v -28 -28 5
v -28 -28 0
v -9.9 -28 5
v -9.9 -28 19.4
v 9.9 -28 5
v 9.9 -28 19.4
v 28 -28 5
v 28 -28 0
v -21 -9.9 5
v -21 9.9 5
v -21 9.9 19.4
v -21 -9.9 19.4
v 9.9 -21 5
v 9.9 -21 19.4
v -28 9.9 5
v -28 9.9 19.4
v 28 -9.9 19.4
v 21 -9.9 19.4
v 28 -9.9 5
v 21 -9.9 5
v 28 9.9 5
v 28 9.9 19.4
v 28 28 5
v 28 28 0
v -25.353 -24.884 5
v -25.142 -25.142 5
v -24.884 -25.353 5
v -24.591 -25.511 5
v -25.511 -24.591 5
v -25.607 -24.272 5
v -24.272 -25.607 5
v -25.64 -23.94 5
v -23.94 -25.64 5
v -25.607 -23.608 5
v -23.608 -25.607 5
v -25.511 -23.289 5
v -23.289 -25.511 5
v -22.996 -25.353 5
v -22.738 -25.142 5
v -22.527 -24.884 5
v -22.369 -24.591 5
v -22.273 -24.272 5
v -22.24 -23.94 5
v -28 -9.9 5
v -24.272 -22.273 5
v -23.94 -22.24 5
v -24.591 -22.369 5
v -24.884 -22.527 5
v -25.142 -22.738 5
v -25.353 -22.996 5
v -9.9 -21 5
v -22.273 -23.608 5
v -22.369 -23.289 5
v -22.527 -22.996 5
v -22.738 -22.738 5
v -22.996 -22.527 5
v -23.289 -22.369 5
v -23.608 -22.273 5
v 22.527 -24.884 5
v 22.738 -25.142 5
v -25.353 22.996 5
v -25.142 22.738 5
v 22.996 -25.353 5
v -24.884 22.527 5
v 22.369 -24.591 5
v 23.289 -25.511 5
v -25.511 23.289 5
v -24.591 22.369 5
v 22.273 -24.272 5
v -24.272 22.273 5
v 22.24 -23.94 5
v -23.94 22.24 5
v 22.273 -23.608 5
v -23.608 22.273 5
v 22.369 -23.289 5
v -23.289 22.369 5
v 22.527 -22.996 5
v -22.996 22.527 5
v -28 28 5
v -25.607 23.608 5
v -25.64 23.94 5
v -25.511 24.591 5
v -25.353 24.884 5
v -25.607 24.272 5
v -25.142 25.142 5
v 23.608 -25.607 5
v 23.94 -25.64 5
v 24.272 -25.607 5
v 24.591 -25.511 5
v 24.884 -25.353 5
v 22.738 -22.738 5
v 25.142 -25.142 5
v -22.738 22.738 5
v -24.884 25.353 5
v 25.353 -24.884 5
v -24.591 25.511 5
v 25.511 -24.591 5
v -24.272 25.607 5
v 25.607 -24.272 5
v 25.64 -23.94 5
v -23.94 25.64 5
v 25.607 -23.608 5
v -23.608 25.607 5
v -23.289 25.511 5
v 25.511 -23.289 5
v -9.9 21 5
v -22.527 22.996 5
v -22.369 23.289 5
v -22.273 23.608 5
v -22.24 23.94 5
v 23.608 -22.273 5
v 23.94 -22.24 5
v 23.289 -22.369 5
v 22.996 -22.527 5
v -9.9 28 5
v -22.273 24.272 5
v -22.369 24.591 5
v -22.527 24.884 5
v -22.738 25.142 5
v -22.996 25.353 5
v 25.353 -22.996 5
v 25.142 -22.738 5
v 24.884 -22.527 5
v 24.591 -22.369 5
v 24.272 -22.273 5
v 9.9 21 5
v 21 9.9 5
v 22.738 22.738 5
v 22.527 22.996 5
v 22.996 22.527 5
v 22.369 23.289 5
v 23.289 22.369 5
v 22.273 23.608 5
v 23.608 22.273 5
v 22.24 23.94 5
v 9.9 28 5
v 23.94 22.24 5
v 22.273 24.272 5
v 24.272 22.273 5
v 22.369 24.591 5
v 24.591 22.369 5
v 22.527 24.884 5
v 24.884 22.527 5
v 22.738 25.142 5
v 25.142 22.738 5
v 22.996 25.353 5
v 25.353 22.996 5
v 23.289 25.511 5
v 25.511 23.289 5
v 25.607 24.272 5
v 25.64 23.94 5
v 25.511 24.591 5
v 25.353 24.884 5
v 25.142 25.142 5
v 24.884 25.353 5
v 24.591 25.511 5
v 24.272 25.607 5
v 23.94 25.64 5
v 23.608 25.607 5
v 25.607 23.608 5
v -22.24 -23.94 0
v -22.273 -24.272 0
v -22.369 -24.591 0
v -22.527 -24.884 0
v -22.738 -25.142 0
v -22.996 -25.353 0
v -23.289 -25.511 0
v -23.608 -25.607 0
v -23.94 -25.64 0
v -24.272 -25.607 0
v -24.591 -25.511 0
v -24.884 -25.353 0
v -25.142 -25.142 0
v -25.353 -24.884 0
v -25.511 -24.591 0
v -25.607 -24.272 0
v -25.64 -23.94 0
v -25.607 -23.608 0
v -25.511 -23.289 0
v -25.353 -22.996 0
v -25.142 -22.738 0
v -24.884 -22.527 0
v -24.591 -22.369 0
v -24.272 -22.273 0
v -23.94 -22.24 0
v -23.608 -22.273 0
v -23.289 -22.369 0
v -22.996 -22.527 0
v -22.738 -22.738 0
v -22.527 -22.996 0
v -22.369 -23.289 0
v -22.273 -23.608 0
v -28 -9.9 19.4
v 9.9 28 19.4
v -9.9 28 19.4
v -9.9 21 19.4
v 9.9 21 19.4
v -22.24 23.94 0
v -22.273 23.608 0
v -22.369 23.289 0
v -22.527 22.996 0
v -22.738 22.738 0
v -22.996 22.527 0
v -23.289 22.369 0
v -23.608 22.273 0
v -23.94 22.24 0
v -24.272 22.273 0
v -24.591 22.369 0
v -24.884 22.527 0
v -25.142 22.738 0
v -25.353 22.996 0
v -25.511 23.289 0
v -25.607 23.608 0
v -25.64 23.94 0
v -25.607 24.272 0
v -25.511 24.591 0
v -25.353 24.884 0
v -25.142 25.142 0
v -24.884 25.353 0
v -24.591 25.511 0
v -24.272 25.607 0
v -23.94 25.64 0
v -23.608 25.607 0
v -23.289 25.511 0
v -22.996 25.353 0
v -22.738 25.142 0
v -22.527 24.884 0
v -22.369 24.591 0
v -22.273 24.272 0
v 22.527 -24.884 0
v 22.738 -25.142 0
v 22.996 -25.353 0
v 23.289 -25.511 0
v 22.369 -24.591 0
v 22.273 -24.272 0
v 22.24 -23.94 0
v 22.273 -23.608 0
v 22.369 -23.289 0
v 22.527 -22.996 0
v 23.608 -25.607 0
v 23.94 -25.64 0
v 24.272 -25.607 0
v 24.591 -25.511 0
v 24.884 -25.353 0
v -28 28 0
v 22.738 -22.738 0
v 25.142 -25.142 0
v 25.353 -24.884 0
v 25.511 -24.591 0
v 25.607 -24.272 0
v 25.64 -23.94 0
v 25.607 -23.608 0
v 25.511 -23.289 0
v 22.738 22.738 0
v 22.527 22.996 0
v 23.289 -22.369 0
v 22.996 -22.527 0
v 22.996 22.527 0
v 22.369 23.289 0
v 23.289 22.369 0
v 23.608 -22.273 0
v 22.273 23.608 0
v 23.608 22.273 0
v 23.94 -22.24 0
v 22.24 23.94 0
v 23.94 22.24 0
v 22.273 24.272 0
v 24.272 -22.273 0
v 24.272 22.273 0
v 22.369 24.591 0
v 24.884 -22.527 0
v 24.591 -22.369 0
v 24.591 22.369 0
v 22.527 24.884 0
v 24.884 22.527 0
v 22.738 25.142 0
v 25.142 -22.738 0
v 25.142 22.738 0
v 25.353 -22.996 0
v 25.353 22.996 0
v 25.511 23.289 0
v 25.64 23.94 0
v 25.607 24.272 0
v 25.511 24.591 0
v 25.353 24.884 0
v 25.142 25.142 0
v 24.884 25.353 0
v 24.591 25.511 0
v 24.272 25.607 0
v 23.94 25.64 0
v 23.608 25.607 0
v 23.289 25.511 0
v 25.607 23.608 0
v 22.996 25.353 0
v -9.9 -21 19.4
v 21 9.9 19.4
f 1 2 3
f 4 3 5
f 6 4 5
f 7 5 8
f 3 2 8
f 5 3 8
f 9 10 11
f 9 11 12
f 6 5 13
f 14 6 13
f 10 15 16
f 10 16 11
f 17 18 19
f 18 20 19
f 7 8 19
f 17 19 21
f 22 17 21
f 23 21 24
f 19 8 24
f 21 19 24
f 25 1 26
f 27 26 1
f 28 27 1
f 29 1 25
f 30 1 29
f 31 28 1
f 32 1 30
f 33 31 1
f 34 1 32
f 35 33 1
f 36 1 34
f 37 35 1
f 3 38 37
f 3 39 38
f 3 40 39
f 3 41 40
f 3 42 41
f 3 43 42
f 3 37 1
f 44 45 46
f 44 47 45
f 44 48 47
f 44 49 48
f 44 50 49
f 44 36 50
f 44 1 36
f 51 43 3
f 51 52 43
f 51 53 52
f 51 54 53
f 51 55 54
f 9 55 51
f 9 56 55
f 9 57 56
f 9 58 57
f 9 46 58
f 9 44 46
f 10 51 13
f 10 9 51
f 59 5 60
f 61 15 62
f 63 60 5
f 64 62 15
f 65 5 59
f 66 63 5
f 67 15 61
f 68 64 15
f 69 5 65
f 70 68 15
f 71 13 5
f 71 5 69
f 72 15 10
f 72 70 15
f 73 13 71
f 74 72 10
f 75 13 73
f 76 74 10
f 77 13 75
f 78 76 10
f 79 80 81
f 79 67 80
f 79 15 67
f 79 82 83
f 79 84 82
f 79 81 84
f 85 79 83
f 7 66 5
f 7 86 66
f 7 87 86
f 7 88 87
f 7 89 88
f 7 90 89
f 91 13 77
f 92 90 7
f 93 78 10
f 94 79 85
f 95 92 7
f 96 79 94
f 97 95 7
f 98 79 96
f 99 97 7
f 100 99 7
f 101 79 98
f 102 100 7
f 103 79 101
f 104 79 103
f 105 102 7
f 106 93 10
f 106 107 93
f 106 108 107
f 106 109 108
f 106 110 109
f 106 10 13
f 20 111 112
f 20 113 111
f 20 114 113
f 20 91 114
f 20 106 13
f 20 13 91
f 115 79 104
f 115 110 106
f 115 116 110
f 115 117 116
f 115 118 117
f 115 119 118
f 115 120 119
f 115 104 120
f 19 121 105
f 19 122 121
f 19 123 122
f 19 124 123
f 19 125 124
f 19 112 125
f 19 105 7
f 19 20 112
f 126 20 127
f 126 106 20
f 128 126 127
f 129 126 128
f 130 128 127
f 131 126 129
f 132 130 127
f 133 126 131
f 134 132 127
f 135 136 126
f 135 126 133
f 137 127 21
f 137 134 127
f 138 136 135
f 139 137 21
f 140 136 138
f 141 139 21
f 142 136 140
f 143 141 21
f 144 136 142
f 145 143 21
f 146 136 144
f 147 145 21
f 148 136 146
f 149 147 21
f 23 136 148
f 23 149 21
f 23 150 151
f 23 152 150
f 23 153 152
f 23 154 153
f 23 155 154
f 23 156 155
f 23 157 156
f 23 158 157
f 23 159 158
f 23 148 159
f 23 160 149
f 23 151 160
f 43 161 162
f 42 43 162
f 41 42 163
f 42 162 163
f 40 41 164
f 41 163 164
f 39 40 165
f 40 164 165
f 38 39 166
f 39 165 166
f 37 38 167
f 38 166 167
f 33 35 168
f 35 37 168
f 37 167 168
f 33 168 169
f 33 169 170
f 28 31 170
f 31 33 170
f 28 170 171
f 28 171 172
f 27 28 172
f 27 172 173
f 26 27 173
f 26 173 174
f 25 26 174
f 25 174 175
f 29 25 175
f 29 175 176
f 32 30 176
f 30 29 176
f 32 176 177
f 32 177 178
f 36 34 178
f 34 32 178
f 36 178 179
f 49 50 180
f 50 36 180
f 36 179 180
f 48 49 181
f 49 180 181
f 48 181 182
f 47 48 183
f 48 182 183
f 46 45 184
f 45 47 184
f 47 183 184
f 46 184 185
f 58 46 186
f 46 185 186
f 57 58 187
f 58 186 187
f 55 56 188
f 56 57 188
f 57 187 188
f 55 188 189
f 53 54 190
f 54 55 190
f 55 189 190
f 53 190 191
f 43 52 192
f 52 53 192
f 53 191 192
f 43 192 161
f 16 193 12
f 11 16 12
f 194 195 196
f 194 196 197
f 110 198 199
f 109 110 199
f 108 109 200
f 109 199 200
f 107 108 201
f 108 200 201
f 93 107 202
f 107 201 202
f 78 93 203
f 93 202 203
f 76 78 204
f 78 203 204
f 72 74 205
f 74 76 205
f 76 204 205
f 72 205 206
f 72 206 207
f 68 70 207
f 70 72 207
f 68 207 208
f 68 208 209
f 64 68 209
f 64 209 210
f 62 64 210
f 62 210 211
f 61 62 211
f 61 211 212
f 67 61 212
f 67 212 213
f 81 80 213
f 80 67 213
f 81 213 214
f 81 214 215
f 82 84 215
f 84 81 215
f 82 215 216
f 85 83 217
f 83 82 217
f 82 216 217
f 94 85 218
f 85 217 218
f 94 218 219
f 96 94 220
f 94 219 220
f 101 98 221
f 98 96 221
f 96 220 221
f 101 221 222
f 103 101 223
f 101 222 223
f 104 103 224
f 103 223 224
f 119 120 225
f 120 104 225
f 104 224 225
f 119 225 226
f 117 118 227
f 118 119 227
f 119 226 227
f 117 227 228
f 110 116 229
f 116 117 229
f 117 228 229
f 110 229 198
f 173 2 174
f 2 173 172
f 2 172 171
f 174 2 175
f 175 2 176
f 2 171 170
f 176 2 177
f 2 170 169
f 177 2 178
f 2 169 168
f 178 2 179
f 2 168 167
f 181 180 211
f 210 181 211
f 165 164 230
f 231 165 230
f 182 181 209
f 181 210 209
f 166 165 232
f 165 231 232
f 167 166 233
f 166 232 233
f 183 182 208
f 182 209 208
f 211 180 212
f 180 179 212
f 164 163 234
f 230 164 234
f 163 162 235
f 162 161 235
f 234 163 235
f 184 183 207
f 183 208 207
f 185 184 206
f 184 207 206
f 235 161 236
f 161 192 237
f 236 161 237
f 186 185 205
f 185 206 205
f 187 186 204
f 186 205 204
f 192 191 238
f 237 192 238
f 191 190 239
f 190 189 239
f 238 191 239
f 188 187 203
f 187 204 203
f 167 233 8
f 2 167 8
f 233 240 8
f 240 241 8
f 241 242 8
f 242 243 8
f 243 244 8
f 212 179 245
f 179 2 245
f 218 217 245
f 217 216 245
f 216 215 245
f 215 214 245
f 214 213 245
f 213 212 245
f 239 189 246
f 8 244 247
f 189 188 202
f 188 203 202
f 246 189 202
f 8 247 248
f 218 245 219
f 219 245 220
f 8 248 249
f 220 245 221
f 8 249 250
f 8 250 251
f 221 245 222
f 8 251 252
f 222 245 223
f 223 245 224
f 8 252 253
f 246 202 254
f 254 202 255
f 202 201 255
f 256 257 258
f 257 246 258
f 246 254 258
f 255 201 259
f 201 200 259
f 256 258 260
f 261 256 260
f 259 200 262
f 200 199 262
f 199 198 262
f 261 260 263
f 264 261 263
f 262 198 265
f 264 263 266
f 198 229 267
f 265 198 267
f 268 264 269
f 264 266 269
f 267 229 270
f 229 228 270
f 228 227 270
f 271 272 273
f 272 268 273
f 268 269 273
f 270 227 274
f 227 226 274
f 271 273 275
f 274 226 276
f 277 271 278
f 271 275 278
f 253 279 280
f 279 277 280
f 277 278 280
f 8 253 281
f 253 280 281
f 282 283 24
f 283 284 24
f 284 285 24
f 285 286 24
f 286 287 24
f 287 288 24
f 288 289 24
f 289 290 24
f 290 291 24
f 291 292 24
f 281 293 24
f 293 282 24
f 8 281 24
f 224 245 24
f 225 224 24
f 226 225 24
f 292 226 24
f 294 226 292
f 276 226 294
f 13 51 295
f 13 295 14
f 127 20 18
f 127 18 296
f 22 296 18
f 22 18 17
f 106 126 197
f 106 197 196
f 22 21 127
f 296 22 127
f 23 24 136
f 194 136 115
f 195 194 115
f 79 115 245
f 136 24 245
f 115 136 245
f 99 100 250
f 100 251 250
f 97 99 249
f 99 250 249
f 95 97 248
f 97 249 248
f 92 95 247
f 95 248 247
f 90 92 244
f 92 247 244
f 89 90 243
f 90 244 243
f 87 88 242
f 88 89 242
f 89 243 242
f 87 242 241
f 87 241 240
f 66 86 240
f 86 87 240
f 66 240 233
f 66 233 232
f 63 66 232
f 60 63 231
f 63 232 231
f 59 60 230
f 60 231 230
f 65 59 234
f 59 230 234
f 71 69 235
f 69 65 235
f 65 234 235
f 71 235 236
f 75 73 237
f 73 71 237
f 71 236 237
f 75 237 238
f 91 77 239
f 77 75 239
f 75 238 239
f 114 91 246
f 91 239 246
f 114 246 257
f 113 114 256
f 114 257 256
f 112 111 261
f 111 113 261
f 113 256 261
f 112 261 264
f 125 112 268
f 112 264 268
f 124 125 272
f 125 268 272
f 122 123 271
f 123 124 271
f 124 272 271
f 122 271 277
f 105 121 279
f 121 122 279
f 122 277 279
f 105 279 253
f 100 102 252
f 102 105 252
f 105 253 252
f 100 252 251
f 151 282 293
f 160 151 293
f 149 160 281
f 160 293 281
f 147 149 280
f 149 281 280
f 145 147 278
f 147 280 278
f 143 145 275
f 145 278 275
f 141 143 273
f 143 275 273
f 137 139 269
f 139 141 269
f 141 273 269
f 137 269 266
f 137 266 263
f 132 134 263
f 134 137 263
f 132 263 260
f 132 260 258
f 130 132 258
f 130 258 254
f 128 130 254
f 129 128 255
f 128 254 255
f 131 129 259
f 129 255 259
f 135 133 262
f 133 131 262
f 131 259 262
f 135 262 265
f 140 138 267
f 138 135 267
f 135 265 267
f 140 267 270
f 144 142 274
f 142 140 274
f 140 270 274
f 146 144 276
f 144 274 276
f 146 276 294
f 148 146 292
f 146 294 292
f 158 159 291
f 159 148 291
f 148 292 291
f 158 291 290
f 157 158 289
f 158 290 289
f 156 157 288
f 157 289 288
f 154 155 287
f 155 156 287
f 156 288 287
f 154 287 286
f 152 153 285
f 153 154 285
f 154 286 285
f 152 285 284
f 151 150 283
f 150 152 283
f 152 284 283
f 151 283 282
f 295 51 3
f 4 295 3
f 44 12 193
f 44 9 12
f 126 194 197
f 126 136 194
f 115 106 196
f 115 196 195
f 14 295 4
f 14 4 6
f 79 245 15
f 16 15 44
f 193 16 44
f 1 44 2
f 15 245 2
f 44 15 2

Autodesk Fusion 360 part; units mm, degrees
sketch "Sketch1" plane through (0, 0, 0) normal (0, 0, 1) x (1, 0, 0)
  line L0 (28, 28) -> (-28, 28)
  line L1 (-28, 28) -> (-28, -28)
  line L2 (-28, -28) -> (28, -28)
  line L3 (28, -28) -> (28, 28)
  line L4 (28, 28) -> (-28, -28) construction
  line L5 (-28, 28) -> (28, -28) construction
  line L6 (21, 21) -> (-21, 21)
  line L7 (-21, 21) -> (-21, -21)
  line L8 (-21, -21) -> (21, -21)
  line L9 (21, -21) -> (21, 21)
  line L10 (21, 21) -> (-21, -21) construction
  line L11 (-21, 21) -> (21, -21) construction
  line L12 (-28, 0) -> (28, 0) construction
  line L13 (0, 28) -> (0, -28) construction
  line L14 (-28, 9.9) -> (-21, 9.9)
  line L15 (-21, 9.9) -> (-21, -9.9)
  line L16 (-21, -9.9) -> (-28, -9.9)
  line L17 (-28, -9.9) -> (-28, 9.9)
  line L18 (21, -9.9) -> (28, -9.9)
  line L19 (28, 9.9) -> (21, 9.9)
  line L20 (-9.9, -28) -> (9.9, -28)
  line L21 (9.9, -28) -> (9.9, -21)
  line L22 (9.9, -21) -> (-9.9, -21)
  line L23 (-9.9, -21) -> (-9.9, -28)
  line L24 (9.9, 28) -> (9.9, 21)
  line L25 (-9.9, 21) -> (-9.9, 28)
  circle A0 centre (23.94, 23.94) radius 1.7
  circle A1 centre (-23.94, 23.94) radius 1.7
  circle A2 centre (23.94, -23.94) radius 1.7
  circle A3 centre (-23.94, -23.94) radius 1.7
  dimension "d1" = 56
  dimension "d2" = 56
  dimension "d3" = 42
  dimension "d4" = 42
  dimension "d5" = 19.8
  dimension "d6" = 19.8
  dimension "d7" = 3.4
  dimension "d8" = 4.06
  dimension "d9" = 7
sketch "Sketch2" plane through (0, 0, 0) normal (0, 1, 0) x (1, 0, 0)
  point P0 (0, -5)
  point P1 (0, -19.4)
  dimension "d10" = 5
  dimension "d11" = 14.4
extrude "Extrude1" add sketch "Sketch1" along normal up to surface (5 mm away)
extrude "Extrude2" add sketch "Sketch1" along normal up to surface (14.4 mm away) from surface at 5 contours L0 L6 L24 L25 | L3 L9 L18 L19 | L1 L7 L14 L15 L16 L17 | L2 L8 L20 L21 L22 L23
equation "d6 = d5"
equation "d8 = 0.29 * ( d1 - d3 )"
